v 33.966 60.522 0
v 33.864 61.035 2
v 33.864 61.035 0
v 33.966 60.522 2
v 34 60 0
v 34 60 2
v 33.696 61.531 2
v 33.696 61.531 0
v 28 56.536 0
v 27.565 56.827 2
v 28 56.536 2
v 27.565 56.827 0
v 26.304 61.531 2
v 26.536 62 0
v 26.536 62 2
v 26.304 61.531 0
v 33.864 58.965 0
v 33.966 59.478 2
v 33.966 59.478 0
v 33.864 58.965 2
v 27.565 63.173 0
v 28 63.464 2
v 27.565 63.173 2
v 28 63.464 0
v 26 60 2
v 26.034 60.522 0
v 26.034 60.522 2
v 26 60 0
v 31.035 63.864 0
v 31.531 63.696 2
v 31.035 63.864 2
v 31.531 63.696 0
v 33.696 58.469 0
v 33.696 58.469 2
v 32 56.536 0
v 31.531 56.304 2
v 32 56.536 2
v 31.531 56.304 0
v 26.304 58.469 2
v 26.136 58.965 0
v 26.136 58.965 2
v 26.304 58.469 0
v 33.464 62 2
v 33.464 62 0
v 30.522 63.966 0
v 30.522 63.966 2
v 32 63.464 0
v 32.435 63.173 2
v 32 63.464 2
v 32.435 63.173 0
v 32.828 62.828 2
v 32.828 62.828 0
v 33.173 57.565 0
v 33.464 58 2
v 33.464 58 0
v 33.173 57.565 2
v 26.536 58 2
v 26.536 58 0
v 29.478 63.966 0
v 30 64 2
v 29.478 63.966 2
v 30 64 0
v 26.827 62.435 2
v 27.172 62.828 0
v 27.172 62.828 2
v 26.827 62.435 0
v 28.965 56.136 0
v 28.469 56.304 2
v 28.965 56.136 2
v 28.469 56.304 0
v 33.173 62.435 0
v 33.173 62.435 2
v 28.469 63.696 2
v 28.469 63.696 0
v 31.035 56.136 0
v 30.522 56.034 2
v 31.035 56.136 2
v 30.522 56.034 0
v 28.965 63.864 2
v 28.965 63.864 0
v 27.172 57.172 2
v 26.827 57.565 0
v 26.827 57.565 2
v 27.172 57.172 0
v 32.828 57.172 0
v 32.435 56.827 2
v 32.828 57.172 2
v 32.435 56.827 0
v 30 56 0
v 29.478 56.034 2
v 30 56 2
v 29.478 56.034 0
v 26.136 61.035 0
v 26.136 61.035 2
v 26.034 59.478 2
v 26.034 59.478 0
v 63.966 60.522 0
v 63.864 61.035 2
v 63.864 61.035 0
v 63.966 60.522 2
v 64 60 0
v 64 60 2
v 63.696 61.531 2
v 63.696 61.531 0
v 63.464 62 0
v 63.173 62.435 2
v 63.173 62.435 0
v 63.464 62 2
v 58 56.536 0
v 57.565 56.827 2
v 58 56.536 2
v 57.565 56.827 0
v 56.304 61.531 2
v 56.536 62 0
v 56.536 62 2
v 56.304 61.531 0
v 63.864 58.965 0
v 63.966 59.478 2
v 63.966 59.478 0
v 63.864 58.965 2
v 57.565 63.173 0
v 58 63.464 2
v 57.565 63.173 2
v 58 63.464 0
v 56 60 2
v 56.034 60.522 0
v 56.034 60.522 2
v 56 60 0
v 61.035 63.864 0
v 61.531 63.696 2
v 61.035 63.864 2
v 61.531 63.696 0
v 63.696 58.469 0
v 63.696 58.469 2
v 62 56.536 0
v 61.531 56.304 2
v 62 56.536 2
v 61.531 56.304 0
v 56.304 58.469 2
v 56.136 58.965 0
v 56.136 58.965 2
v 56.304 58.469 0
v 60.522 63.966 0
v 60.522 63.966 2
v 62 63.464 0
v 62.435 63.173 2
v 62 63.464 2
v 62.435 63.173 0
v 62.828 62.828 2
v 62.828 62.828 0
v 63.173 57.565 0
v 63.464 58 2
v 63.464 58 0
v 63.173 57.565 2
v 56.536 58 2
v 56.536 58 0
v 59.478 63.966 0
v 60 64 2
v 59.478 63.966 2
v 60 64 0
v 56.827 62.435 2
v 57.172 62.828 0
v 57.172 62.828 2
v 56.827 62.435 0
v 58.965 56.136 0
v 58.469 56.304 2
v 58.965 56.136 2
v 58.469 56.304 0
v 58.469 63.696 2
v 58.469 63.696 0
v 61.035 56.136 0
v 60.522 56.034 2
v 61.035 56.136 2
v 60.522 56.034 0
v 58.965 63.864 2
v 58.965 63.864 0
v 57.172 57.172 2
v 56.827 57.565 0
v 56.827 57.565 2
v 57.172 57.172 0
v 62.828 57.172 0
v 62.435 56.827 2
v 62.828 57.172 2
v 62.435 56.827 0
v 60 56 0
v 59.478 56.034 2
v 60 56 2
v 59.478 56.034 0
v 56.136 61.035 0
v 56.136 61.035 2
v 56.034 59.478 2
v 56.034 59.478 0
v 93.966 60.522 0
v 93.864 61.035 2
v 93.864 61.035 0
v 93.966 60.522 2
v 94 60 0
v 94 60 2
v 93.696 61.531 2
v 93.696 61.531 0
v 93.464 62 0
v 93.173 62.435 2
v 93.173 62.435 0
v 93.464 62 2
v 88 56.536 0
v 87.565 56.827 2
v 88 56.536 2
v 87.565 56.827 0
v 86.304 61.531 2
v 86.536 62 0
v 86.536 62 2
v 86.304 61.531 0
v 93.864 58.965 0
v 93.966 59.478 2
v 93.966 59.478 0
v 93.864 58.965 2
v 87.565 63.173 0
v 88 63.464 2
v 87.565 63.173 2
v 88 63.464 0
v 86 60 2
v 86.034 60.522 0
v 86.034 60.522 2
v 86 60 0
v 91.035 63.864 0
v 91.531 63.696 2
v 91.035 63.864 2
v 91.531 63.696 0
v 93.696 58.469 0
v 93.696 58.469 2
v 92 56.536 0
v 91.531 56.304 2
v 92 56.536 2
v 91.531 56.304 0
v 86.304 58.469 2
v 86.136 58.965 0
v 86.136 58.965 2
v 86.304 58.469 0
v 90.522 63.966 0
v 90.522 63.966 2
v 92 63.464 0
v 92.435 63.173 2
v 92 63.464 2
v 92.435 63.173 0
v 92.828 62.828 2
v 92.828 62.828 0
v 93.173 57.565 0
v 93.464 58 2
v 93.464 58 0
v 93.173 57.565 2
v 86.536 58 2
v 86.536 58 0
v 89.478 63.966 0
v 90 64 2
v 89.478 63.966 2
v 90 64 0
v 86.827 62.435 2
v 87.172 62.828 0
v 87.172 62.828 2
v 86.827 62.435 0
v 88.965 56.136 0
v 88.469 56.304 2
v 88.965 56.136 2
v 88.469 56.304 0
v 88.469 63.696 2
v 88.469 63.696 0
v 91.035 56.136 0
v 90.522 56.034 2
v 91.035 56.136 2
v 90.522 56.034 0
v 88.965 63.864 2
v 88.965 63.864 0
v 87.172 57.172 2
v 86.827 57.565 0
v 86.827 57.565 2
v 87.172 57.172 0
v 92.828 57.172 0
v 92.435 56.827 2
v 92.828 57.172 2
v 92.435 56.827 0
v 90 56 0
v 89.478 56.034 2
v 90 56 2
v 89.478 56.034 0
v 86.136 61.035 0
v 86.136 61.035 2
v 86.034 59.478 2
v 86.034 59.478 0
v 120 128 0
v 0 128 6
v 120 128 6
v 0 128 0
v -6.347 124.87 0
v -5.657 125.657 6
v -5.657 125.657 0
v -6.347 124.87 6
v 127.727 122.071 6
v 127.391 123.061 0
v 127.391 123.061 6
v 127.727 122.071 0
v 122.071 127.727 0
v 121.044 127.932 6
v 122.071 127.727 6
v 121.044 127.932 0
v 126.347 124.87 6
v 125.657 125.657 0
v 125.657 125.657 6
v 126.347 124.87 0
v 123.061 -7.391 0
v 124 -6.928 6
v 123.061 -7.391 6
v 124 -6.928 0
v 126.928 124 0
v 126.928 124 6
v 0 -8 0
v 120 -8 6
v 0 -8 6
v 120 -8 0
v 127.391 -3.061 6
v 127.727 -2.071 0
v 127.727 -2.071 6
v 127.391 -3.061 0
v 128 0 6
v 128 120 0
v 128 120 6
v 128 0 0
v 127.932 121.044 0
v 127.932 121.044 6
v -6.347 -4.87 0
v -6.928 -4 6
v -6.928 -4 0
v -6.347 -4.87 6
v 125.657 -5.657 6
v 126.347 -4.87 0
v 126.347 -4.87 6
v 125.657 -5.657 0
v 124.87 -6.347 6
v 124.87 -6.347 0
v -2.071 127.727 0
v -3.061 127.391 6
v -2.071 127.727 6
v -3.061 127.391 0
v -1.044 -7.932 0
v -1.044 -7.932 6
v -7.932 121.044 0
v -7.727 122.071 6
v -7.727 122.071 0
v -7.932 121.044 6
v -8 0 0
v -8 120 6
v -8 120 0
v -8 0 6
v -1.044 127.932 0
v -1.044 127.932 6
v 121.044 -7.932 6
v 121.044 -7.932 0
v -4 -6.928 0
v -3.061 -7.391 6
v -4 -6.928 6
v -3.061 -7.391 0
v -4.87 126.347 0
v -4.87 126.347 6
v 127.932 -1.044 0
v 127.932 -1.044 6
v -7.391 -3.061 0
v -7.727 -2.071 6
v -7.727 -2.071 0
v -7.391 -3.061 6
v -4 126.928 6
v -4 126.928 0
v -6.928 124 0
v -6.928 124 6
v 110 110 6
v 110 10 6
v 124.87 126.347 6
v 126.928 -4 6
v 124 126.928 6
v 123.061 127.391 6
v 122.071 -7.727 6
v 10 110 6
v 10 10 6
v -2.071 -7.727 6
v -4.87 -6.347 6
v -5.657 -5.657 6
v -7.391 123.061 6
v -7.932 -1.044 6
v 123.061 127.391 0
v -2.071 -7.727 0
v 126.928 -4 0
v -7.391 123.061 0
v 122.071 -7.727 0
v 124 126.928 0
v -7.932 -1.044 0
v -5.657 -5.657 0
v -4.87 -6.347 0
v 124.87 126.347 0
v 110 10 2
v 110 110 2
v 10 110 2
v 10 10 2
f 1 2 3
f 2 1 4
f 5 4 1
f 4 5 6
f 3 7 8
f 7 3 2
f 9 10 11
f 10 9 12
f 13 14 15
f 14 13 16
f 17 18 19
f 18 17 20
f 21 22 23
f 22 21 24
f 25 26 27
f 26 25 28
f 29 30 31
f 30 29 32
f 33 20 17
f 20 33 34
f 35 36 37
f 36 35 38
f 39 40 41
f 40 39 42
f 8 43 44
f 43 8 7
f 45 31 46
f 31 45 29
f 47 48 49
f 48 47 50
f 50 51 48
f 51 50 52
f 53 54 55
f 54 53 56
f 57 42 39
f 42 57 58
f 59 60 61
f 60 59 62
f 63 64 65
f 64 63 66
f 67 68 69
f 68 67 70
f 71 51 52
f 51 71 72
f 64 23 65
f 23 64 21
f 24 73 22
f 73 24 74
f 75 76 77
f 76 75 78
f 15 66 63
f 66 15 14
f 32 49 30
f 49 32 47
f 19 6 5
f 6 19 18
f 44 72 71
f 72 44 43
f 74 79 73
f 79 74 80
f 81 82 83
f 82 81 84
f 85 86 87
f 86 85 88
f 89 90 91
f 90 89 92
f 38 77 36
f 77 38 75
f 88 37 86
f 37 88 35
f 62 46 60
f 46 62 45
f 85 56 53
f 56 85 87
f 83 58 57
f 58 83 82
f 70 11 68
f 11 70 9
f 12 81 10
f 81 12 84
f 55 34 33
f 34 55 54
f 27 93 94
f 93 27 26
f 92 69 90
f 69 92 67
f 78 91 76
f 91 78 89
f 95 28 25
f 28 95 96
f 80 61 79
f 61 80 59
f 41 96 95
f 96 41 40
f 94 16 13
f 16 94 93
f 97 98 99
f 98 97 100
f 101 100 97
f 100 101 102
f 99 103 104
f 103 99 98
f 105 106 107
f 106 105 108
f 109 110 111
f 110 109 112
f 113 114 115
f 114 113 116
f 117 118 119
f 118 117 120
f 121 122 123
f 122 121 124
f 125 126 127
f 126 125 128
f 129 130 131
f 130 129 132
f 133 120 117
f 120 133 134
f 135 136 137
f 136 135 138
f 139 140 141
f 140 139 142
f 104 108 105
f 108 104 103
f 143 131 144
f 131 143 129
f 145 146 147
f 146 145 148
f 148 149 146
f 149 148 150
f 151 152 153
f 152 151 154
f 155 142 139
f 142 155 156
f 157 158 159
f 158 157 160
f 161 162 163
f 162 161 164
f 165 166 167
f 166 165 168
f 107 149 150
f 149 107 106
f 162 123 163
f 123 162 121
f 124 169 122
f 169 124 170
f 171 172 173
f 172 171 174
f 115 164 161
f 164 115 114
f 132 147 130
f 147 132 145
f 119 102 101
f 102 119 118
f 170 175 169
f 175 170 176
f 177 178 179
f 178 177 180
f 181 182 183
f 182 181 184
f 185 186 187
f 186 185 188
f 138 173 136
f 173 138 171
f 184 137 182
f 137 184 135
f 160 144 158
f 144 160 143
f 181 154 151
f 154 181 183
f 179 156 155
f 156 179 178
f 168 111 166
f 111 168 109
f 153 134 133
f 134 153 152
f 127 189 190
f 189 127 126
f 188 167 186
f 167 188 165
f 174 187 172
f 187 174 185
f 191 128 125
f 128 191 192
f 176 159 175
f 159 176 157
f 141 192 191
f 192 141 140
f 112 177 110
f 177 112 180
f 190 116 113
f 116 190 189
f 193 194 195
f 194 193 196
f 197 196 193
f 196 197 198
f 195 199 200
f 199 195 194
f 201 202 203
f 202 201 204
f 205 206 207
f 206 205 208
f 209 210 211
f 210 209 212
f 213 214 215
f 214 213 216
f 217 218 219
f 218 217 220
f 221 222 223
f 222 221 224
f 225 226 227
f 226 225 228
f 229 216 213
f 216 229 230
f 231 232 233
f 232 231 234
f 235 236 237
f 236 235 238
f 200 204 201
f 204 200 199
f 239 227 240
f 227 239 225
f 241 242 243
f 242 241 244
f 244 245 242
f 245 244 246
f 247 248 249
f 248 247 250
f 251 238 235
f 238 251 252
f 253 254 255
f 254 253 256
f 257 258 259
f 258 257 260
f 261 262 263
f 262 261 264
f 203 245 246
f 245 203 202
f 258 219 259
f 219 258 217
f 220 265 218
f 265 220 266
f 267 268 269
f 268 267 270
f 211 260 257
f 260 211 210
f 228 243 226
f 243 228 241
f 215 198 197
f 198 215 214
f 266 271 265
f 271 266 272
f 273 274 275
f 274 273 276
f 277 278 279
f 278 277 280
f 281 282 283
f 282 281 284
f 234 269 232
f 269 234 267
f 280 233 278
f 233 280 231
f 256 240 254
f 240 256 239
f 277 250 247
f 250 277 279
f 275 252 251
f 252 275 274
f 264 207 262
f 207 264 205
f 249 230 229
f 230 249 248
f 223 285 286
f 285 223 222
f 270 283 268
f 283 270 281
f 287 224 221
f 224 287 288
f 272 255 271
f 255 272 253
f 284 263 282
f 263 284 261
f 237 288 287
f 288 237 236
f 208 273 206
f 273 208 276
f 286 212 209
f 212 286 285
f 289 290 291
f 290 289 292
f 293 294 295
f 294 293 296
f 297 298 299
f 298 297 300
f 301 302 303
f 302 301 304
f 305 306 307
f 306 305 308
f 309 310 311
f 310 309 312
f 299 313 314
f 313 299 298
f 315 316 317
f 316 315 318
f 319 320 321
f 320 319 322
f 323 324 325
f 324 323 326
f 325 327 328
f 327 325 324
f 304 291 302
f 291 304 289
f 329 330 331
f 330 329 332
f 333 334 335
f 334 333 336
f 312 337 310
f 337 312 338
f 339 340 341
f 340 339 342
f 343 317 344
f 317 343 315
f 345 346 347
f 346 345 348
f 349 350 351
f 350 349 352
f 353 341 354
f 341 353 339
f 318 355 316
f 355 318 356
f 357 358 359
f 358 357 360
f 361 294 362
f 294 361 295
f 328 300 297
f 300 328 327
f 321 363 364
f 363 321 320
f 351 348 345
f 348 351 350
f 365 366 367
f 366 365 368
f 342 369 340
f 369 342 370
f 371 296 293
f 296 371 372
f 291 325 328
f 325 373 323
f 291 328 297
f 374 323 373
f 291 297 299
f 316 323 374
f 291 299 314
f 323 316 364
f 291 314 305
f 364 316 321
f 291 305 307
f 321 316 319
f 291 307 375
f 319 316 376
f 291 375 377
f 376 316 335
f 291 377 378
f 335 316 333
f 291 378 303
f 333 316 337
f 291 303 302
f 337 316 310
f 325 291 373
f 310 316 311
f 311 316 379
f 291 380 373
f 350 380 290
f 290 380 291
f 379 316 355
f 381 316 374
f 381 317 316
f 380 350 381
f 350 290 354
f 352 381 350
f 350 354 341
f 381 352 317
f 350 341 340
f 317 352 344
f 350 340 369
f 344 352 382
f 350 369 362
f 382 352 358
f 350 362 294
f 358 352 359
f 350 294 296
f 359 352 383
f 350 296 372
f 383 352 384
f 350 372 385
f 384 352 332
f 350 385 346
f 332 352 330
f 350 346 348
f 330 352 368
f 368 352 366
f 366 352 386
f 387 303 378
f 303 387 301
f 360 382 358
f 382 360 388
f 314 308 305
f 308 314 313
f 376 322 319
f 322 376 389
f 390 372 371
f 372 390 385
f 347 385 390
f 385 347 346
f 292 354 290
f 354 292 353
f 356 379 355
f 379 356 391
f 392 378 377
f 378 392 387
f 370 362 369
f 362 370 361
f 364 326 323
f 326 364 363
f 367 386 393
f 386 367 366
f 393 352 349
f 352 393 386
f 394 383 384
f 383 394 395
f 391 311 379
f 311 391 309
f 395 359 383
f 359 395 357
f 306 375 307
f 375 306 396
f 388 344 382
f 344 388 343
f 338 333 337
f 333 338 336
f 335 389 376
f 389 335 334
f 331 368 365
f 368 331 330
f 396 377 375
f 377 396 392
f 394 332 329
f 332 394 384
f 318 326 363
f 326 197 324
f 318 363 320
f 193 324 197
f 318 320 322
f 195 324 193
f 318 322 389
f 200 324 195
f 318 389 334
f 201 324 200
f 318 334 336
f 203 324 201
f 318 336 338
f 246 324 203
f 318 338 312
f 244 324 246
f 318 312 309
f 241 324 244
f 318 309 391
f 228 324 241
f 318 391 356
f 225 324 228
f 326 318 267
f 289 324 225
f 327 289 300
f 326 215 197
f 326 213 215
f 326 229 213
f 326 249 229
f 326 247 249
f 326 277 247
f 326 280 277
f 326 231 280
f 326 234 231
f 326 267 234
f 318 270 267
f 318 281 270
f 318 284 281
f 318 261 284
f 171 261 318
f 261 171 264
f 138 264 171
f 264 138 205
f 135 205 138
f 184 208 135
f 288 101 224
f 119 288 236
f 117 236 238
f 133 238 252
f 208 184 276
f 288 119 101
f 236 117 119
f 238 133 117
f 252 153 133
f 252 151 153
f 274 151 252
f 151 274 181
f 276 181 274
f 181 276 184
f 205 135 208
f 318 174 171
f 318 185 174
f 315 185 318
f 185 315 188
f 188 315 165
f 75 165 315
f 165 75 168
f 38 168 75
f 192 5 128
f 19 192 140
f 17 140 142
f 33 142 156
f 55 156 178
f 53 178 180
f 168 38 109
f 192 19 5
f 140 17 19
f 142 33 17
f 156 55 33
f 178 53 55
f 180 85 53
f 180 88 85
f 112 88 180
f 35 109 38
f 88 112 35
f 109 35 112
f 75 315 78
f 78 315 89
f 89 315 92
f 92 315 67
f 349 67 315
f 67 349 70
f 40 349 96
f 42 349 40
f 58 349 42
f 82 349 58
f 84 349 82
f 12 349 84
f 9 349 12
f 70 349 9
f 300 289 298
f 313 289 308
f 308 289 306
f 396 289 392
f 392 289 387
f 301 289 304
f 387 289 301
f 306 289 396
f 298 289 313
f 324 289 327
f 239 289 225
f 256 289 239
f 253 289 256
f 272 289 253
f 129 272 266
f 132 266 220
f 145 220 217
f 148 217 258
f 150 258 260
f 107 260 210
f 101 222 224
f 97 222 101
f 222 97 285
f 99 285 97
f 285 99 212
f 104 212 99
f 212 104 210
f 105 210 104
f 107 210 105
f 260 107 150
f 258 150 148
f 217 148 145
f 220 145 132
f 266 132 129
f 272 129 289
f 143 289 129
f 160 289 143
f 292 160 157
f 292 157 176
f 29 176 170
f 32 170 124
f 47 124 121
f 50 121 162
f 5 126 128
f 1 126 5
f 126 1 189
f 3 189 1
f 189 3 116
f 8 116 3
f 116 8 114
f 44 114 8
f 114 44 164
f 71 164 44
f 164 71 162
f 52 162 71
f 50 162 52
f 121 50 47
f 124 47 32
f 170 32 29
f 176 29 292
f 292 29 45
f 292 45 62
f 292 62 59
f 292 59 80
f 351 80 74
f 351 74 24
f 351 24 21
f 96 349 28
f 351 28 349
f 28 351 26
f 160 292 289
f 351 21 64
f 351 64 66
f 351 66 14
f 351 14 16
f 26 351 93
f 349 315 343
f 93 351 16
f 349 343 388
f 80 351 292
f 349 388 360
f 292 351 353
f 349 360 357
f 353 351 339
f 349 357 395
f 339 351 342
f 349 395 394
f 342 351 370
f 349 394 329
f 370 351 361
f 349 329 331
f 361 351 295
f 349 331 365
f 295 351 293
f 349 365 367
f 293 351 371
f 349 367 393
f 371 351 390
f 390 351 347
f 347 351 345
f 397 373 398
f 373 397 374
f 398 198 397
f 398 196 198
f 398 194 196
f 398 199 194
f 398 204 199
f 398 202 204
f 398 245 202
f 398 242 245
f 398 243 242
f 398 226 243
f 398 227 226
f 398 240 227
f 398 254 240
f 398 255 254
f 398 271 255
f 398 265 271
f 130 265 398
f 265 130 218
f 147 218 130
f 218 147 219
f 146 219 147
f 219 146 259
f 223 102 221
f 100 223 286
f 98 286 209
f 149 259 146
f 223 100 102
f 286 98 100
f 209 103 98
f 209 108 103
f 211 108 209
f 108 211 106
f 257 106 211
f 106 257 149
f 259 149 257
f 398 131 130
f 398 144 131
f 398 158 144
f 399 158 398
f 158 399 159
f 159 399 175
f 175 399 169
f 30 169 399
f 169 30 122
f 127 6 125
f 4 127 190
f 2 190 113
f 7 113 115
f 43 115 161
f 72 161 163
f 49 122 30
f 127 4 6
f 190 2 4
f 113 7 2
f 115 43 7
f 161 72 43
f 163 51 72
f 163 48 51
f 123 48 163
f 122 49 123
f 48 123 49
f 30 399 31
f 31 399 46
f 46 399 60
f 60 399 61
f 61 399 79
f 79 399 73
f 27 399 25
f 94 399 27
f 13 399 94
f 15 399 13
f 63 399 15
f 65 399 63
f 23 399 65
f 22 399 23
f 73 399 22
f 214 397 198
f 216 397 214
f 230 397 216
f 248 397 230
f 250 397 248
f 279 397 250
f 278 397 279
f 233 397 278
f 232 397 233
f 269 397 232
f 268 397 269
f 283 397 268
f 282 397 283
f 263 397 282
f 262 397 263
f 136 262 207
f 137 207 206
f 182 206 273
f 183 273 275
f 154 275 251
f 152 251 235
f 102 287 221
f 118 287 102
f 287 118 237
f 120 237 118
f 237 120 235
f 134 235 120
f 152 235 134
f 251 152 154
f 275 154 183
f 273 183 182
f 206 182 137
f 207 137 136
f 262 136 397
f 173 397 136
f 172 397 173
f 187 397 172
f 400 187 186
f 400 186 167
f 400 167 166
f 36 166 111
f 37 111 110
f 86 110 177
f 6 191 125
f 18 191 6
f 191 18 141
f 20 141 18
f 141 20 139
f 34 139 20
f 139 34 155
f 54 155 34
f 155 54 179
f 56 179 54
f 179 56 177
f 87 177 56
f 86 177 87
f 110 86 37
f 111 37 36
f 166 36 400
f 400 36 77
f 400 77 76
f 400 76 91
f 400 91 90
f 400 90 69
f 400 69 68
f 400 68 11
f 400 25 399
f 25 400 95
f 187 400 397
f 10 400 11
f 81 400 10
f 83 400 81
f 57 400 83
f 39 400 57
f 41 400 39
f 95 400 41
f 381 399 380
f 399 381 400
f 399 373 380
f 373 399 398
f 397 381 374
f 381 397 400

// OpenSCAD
// PlantSense Template C — Under-pot mat
$fn=48;
difference(){
  hull(){ for(x=[0,120]) for(y=[0,120]) translate([x,y,0]) cylinder(h=6,r=8); }
  translate([10,10,2]) cube([100,100,5]);
  for(x=[30,60,90]) translate([x,60,-0.1]) cylinder(h=8,r=4);
}
